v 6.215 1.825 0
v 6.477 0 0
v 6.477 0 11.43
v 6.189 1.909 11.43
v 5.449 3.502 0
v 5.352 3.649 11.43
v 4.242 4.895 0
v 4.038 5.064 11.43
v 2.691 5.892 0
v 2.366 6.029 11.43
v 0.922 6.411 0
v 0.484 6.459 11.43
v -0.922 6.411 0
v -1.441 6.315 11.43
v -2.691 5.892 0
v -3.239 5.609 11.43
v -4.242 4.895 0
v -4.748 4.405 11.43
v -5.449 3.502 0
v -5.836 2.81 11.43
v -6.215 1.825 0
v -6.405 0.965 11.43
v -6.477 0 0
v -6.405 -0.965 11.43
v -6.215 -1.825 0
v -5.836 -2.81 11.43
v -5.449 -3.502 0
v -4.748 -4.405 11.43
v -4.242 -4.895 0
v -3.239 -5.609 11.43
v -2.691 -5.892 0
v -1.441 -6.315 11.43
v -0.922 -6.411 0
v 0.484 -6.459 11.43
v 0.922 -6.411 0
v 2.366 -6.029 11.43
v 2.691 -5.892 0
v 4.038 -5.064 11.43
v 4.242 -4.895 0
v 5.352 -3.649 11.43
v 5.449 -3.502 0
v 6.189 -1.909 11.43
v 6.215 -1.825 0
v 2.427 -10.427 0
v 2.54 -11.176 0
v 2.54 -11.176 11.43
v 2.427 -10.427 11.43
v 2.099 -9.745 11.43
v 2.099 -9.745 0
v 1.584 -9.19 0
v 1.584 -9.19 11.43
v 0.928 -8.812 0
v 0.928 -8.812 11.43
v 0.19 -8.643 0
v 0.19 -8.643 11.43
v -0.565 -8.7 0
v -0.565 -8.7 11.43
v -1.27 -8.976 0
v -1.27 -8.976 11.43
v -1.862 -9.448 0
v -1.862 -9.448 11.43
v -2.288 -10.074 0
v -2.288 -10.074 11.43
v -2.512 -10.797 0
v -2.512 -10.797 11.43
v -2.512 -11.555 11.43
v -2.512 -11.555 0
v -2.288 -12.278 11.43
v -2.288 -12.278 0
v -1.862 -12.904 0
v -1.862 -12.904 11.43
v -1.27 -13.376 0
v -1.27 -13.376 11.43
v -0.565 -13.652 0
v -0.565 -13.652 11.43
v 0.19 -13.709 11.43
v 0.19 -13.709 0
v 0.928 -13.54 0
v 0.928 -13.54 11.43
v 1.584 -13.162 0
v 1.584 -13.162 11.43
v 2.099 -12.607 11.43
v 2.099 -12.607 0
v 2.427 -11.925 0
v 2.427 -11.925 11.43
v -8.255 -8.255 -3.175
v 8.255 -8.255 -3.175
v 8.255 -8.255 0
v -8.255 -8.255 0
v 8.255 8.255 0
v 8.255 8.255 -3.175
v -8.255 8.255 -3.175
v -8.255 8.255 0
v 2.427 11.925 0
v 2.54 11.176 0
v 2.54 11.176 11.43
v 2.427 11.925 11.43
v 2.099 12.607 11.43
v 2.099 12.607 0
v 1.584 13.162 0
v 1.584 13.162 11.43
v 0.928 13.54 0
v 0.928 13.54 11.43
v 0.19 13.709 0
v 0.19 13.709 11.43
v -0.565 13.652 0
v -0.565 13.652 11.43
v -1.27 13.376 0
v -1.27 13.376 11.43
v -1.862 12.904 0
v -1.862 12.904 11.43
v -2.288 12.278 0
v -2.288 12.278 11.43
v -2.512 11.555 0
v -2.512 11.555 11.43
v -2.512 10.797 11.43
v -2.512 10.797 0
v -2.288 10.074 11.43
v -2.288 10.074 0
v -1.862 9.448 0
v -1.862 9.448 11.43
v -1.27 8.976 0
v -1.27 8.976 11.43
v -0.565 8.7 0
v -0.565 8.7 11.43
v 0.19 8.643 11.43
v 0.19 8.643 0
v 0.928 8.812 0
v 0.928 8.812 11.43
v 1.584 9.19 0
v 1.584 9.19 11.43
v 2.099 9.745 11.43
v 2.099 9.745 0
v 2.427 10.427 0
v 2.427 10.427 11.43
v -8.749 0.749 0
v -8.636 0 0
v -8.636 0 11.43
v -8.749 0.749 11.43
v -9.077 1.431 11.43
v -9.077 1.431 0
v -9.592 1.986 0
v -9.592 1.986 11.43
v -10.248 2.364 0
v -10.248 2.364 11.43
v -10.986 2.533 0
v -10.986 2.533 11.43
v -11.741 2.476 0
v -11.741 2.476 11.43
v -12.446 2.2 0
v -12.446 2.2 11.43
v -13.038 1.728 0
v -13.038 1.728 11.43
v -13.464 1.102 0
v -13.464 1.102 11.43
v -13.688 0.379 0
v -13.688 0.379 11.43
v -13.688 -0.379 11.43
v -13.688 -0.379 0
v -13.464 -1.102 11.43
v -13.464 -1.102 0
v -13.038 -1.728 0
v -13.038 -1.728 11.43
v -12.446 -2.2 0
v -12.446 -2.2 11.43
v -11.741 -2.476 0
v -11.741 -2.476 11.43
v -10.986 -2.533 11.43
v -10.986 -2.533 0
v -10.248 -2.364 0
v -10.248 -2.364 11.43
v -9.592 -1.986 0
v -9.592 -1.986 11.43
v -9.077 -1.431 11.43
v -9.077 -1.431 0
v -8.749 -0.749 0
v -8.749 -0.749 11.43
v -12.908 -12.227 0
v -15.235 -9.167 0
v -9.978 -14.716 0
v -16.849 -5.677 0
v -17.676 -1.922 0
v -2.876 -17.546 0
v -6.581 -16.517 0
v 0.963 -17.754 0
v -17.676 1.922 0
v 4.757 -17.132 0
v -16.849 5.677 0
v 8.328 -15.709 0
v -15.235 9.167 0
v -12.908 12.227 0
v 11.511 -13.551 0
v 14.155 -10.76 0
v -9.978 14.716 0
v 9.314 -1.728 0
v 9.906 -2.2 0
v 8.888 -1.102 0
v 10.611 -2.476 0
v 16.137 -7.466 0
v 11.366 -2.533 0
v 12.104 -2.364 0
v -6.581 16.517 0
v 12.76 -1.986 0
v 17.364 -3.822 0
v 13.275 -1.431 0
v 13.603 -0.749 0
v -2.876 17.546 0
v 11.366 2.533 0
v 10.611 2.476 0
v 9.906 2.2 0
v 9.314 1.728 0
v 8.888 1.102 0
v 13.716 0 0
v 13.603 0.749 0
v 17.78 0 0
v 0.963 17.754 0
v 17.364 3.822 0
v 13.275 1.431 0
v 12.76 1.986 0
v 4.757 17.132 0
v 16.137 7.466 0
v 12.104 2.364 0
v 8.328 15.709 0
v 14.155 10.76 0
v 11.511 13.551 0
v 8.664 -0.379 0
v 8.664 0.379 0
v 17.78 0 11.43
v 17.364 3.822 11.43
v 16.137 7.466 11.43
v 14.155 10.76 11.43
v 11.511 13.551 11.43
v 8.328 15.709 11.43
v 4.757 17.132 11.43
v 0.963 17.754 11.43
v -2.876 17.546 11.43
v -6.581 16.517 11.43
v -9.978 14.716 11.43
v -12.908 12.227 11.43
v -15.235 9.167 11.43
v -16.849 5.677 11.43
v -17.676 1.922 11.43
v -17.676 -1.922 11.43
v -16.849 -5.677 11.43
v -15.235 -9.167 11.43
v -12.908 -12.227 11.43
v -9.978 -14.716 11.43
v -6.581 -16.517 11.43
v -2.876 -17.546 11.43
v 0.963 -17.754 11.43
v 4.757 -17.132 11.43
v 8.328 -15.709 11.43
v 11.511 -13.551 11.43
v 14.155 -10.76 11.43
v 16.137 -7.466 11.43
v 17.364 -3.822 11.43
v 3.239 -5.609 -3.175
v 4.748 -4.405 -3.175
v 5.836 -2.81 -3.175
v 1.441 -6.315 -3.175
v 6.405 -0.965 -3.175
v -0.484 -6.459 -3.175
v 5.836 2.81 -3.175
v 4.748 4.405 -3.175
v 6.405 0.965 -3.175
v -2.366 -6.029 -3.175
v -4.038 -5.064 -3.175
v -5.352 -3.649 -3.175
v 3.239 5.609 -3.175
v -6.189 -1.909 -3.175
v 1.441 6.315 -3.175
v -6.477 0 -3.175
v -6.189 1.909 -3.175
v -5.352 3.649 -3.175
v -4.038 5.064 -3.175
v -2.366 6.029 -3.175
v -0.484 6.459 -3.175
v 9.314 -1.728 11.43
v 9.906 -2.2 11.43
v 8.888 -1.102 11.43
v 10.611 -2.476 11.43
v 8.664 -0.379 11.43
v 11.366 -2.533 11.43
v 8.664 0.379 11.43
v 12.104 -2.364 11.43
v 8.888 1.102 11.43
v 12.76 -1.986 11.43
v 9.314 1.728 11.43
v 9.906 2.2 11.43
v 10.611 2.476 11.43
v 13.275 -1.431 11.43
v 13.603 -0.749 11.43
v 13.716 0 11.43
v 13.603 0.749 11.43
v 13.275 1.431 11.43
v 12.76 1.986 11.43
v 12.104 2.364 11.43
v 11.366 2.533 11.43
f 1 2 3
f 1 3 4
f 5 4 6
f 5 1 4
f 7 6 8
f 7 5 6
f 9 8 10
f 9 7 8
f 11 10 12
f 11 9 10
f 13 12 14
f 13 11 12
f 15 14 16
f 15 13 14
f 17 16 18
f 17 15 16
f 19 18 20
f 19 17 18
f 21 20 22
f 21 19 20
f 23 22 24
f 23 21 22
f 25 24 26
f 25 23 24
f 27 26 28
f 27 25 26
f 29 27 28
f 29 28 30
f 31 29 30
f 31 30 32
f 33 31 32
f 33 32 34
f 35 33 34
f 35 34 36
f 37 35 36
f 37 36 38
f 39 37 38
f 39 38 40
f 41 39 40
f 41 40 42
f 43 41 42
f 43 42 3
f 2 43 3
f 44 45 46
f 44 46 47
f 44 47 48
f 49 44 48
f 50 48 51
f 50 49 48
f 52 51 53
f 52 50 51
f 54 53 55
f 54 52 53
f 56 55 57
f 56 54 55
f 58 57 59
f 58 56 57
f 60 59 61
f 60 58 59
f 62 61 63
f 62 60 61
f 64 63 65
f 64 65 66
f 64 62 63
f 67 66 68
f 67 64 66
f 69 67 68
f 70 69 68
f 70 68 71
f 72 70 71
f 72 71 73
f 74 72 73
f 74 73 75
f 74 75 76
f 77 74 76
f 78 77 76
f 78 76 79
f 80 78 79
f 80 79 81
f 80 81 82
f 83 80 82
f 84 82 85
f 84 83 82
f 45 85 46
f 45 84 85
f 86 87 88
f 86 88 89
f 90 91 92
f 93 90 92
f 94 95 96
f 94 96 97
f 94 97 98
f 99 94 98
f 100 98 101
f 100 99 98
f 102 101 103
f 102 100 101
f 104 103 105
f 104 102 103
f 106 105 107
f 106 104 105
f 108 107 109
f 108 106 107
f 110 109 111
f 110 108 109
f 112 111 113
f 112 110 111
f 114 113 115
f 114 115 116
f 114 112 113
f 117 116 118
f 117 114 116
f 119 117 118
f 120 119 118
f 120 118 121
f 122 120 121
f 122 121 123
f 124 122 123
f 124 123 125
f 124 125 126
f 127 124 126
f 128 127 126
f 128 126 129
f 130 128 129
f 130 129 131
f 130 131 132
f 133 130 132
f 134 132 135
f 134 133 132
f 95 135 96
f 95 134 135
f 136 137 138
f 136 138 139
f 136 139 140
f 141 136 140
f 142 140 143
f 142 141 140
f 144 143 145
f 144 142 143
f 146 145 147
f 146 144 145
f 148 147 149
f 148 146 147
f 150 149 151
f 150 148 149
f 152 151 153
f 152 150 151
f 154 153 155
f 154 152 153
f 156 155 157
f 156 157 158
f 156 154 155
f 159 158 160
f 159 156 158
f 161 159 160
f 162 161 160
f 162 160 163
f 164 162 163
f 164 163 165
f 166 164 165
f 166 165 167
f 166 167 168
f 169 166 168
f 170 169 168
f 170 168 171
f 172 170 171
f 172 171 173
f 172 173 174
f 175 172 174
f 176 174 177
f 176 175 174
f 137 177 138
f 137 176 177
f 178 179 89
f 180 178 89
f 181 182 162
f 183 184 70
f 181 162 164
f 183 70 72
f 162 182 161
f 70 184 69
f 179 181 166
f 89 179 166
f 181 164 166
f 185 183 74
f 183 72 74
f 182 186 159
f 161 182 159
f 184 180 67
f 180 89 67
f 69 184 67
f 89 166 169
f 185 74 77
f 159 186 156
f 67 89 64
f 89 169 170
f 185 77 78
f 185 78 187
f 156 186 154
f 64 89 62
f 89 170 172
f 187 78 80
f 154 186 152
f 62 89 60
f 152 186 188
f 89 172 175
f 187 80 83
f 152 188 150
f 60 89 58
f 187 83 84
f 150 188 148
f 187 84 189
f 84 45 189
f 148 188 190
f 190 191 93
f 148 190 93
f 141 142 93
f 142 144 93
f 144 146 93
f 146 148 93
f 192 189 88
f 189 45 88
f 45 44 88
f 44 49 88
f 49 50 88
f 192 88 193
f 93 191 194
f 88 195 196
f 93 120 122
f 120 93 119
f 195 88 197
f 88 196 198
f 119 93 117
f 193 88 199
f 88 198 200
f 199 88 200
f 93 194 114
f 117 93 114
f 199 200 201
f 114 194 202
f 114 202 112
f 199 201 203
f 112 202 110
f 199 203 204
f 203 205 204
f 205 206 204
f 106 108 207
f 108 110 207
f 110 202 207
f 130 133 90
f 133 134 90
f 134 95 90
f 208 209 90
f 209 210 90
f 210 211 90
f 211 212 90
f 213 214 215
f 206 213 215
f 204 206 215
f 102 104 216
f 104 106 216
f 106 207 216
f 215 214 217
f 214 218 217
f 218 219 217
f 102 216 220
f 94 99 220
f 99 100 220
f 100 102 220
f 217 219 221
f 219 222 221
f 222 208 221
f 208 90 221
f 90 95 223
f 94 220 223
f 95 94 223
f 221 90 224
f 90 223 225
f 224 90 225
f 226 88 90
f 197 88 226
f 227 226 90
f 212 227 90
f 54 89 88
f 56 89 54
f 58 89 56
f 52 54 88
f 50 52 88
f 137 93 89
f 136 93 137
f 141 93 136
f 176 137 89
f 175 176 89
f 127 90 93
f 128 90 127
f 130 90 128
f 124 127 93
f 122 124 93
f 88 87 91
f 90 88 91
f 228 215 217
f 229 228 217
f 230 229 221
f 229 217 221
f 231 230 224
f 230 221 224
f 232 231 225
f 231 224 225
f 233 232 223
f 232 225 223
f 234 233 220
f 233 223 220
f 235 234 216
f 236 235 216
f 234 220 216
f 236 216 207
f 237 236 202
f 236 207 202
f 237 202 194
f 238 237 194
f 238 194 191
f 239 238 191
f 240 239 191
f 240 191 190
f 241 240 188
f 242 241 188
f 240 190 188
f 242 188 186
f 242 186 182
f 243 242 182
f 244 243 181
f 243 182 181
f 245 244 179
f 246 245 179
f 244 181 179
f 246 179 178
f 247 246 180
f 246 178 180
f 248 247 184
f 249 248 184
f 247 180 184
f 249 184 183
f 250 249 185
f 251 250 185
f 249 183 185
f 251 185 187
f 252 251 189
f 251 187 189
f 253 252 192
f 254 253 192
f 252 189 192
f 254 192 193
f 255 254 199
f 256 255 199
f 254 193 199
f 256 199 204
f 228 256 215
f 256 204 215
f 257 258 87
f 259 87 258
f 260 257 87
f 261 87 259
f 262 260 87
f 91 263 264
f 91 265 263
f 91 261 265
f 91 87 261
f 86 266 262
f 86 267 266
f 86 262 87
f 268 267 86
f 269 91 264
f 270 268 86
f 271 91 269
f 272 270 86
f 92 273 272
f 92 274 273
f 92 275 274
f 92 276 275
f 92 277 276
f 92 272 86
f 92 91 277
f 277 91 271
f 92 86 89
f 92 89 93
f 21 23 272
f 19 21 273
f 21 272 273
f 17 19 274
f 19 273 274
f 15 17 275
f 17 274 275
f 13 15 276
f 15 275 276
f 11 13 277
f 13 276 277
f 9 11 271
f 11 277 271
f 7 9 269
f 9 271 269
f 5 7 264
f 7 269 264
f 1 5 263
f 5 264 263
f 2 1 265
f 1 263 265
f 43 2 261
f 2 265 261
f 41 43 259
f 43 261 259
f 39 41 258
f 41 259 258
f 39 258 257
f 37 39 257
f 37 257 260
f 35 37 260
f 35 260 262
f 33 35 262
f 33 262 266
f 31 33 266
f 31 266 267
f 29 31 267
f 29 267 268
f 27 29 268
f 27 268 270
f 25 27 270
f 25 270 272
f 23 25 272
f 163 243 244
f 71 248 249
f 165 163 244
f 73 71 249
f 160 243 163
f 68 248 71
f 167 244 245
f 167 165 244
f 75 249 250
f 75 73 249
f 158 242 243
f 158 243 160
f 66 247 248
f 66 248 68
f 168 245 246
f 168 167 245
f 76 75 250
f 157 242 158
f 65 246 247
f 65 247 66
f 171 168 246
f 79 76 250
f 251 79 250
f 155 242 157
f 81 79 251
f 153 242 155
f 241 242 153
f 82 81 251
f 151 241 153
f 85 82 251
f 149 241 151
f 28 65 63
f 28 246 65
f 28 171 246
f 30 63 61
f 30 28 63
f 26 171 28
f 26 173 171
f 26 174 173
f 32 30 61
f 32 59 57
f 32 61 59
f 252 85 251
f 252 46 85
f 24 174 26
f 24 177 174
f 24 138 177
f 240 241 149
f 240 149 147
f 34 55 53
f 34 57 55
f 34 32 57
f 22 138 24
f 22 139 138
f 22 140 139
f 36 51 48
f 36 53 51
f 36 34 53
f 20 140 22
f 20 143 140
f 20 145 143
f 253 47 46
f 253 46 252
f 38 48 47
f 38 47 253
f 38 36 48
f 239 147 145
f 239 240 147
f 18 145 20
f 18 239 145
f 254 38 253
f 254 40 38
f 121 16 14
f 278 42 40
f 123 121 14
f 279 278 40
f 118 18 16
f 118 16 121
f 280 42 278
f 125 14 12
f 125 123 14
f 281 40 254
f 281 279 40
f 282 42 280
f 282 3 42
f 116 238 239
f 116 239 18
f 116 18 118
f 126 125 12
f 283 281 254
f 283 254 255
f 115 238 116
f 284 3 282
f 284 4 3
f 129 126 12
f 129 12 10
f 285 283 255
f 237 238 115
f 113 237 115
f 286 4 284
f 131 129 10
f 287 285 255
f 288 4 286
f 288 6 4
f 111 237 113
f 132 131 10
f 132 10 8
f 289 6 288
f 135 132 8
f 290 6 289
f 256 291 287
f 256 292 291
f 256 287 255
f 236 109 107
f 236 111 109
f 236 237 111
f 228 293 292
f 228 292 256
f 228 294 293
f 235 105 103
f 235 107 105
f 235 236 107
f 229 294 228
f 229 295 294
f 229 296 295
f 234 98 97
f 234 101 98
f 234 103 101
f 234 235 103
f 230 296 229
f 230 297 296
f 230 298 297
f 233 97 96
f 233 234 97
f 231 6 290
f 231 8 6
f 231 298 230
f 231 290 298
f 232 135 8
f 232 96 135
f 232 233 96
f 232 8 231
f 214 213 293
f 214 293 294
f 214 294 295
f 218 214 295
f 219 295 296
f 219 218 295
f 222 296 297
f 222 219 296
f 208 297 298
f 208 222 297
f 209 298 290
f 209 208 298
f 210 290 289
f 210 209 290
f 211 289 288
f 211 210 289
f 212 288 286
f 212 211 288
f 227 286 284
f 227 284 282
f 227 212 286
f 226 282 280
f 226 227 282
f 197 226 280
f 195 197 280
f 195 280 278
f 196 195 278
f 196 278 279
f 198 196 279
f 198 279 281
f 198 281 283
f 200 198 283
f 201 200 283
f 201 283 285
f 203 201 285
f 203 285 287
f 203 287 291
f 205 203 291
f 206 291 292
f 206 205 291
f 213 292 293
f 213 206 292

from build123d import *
from build123d.topology import SkipClean

# Parameters (mm, degrees)
SKETCH1_R           = 17.78
SKETCH1_R_2         = 2.54
SKETCH1_R_3         = 6.477
BOSS_EXTRUDE1_DEPTH = 11.43
BOSS_EXTRUDE2_START = 3.175
SKETCH2_W           = 16.51
SKETCH2_H           = 16.51
SKETCH2_R           = 6.477
BOSS_EXTRUDE2_DEPTH = 3.175


with BuildPart() as part:
    # Sketch1 → Boss-Extrude1 (new body)
    with BuildSketch(Plane.XY):
        Circle(SKETCH1_R)
        with Locations((-11.176, 0)):
            Circle(SKETCH1_R_2, mode=Mode.SUBTRACT)
        with Locations((0, -11.176)):
            Circle(SKETCH1_R_2, mode=Mode.SUBTRACT)
        with Locations((11.176, 0)):
            Circle(SKETCH1_R_2, mode=Mode.SUBTRACT)
        with Locations((0, 11.176)):
            Circle(SKETCH1_R_2, mode=Mode.SUBTRACT)
        Circle(SKETCH1_R_3, mode=Mode.SUBTRACT)
    extrude(amount=BOSS_EXTRUDE1_DEPTH)

    # Sketch2 → Boss-Extrude2 (add)
    with SkipClean():  # the faces are left unmerged after this step: merging them gives an invalid solid
        with BuildSketch(Plane(origin=(0, 0, 0), x_dir=(-1, 0, 0), z_dir=(0, 0, -1)).offset(BOSS_EXTRUDE2_START)):
            Rectangle(SKETCH2_W, SKETCH2_H)
            Circle(SKETCH2_R, mode=Mode.SUBTRACT)
        extrude(amount=-BOSS_EXTRUDE2_DEPTH)


solid = part.part
